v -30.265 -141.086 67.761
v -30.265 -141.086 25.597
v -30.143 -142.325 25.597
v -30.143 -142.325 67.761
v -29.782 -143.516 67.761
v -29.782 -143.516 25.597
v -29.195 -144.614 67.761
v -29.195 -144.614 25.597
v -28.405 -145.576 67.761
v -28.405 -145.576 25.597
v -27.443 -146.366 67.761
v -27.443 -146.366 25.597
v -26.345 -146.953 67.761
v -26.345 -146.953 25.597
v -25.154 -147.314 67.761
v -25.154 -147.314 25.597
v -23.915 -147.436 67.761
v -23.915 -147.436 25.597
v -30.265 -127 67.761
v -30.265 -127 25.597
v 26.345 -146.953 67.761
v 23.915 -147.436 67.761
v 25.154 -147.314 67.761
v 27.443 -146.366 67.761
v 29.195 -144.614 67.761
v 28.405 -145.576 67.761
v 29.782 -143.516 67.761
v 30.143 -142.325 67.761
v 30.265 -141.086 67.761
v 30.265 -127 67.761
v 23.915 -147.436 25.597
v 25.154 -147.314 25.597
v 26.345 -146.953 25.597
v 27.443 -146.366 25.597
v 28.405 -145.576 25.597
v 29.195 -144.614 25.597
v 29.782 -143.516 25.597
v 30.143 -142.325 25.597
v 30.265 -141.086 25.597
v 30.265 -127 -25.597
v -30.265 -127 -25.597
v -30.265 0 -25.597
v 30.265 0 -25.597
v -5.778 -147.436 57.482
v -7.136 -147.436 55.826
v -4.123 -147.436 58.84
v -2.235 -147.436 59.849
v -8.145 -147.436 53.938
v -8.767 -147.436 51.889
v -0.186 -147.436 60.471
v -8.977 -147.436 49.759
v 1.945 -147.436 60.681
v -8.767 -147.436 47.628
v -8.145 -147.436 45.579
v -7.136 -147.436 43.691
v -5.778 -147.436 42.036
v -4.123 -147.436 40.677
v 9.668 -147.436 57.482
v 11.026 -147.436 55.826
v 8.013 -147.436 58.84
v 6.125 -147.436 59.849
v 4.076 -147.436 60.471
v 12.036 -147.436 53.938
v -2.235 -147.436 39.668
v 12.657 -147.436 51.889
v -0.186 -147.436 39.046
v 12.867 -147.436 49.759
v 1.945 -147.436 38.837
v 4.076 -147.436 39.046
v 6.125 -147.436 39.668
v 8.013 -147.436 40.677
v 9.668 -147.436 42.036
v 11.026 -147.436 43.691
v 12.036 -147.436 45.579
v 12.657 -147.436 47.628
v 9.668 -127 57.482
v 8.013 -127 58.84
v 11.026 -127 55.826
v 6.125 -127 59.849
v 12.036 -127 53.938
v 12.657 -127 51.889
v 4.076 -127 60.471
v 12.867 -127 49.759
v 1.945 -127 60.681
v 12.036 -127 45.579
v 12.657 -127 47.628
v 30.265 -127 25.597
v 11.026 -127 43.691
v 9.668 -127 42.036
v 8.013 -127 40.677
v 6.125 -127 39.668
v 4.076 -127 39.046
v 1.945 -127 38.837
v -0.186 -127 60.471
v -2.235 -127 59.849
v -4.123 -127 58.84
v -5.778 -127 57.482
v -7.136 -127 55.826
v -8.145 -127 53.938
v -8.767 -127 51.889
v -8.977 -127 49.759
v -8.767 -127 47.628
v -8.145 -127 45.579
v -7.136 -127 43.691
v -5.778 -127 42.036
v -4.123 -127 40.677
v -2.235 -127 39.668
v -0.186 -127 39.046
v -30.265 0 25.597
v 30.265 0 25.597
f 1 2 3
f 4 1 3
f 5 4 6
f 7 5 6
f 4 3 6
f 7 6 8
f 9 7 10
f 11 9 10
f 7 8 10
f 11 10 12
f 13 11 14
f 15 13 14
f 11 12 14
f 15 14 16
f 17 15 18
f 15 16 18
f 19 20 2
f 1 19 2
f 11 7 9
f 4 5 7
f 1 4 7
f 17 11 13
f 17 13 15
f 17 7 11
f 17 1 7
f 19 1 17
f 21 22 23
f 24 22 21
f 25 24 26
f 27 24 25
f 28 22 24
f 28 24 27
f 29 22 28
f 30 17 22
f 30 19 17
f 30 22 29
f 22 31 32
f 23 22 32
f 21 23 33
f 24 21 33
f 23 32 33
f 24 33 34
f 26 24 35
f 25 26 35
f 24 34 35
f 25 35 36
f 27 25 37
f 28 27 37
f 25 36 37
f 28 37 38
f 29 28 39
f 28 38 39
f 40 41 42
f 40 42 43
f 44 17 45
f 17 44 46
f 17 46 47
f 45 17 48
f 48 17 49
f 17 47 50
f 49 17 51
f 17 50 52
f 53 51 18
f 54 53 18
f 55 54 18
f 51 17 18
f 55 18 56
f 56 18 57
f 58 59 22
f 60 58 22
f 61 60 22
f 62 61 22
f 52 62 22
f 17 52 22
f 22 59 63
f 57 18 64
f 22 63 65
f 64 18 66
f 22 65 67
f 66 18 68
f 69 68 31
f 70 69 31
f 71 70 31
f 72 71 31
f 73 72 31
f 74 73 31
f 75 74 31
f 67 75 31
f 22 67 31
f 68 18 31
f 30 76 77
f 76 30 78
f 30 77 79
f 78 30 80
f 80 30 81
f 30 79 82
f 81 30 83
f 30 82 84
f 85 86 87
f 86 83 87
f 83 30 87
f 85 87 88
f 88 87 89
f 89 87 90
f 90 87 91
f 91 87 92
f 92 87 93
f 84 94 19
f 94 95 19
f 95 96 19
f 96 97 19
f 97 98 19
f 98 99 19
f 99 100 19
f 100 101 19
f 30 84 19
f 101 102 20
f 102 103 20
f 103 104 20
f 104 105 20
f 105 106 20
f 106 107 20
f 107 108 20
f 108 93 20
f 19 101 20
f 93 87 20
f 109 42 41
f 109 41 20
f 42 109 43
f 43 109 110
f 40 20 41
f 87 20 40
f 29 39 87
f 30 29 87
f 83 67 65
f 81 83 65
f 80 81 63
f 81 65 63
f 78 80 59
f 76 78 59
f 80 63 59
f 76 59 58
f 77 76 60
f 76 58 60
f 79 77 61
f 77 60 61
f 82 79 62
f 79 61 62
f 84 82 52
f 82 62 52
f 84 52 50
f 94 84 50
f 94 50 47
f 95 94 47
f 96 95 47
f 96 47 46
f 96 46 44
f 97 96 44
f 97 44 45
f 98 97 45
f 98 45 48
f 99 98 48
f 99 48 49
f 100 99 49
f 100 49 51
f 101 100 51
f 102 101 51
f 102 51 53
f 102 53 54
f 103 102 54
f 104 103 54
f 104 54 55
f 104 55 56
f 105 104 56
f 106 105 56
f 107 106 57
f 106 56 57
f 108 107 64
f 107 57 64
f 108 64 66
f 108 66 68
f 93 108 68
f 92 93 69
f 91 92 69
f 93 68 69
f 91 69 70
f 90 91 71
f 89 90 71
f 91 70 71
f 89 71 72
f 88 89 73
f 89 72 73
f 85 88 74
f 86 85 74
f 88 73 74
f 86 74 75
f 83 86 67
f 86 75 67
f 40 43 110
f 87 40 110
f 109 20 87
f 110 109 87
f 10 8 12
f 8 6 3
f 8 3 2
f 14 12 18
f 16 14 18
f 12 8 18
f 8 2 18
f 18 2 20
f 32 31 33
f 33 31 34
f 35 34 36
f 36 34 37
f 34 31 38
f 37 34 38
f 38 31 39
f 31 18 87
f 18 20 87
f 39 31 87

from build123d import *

# Parameters (mm, degrees)
F0_W     = 60.5307035148
F0_H     = 51.193524152
F1_DEPTH = 127
F3_DEPTH = 42.164
F4_R     = 10.922
F5_DEPTH = 25.4


# Not quite as in the source:
# - the program builds the solid bodies; features that only make, move or delete a surface that nothing else refers to are left out


with BuildPart() as f1:
    # F0 (on Front) → F1 (new body)
    with BuildSketch(Plane.XZ):
        Rectangle(F0_W, F0_H)
    extrude(amount=F1_DEPTH)


with BuildPart() as f3:
    # F2 (on face) → F3 (new body)
    with BuildSketch(Plane.XY.offset(25.596762076)):
        with BuildLine():
            Line((30.2653517574, -127), (-30.2653517574, -127))
            Line((-30.2653517574, -127), (-30.2653517574, -141.0862502229))
            ThreePointArc((-30.2653517574, -141.0862502229), (-28.4054798179, -145.5763782835), (-23.9153517574, -147.4362502229))
            Line((-23.9153517574, -147.4362502229), (23.9153517574, -147.4362502229))
            ThreePointArc((23.9153517574, -147.4362502229), (28.4054798179, -145.5763782835), (30.2653517574, -141.0862502229))
            Line((30.2653517574, -141.0862502229), (30.2653517574, -127))
        make_face()
    extrude(amount=F3_DEPTH)

    # F4 (on face) → F5 (cut)
    with BuildSketch(Plane.XZ.offset(147.4362502229)):
        with Locations((1.9451410044, 49.7585572302)):
            Circle(F4_R)
    extrude(amount=-F5_DEPTH, mode=Mode.SUBTRACT)


solid = Compound([f1.part, f3.part])
